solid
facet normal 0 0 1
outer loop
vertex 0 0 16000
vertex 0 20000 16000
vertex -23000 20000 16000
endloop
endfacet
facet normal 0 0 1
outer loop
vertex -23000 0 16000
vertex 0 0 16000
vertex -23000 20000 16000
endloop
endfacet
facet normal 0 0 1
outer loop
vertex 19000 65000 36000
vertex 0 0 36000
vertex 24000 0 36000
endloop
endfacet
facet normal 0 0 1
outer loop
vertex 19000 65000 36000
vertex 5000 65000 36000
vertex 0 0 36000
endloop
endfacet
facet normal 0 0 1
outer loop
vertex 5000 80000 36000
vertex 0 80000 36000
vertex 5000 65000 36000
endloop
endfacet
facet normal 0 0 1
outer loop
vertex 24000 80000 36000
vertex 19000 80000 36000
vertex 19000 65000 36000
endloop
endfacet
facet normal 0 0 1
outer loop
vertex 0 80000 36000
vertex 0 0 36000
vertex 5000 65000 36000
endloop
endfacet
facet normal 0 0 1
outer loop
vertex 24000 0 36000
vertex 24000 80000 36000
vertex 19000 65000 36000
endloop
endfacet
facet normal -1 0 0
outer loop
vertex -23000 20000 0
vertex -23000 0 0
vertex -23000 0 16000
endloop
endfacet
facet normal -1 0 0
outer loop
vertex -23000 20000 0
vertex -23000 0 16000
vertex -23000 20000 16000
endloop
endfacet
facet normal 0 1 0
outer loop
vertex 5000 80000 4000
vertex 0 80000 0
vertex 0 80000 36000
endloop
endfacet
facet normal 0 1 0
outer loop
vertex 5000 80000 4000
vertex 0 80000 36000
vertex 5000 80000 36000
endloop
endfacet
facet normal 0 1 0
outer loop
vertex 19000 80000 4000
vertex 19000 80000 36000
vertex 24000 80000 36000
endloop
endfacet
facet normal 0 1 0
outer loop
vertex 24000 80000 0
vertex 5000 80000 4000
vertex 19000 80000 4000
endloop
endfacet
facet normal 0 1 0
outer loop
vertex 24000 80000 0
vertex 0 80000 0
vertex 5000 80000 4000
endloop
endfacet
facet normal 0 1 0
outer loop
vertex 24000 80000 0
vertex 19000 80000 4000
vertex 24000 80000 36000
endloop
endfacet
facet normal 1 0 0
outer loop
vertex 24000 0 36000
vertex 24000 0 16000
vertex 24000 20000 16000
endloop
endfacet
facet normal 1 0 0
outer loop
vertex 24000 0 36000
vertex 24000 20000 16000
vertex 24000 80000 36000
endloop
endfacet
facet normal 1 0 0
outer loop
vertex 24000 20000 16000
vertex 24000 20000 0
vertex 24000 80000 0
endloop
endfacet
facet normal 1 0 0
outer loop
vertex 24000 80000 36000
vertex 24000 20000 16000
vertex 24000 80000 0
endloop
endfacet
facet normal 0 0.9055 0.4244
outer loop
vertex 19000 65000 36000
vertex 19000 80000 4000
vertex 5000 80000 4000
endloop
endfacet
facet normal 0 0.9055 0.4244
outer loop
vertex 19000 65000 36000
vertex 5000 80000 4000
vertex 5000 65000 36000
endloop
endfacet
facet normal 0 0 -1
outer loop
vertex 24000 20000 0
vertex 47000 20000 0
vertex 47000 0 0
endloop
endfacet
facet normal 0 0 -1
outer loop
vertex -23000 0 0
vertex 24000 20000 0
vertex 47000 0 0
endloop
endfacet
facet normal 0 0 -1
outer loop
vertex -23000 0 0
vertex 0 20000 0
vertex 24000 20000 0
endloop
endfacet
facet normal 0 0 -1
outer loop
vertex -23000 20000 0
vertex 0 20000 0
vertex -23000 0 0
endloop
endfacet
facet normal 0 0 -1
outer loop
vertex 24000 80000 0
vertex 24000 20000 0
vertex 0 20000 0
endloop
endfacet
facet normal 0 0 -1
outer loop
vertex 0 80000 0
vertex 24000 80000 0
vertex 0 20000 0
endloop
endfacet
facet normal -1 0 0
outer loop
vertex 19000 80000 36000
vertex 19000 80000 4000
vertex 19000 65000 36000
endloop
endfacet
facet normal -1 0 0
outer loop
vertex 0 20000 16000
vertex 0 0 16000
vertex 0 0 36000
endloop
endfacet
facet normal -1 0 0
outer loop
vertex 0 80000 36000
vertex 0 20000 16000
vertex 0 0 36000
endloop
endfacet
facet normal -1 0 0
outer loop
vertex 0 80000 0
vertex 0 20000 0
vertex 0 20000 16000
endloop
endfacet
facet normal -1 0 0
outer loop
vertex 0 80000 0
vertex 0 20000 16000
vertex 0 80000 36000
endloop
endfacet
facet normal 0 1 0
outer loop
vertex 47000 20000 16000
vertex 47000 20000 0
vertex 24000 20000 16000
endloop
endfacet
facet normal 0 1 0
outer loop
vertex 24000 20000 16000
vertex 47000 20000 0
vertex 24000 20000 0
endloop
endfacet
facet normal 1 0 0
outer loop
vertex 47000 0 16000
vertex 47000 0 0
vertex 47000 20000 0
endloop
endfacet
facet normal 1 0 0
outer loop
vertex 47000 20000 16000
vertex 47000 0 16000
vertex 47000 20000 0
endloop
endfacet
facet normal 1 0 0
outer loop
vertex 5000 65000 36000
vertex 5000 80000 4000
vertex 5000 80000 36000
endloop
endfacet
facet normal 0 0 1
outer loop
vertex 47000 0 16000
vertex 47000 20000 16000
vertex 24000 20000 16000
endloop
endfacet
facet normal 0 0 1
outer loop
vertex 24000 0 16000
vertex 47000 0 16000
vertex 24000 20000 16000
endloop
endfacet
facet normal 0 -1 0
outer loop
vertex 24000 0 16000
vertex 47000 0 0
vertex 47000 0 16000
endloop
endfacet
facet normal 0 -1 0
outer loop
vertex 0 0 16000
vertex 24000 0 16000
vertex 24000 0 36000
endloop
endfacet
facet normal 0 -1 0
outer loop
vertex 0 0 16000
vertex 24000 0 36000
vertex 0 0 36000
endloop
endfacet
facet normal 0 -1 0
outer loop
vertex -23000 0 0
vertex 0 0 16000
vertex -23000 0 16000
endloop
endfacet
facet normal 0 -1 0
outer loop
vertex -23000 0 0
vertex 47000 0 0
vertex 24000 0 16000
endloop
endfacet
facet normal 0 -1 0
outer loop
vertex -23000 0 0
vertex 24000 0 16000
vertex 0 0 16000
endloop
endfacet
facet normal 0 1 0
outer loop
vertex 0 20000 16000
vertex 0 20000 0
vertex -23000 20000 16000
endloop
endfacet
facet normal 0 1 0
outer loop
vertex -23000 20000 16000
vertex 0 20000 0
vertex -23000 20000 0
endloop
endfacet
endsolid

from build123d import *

# Parameters (mm, degrees)
SKETCH1_W           = 24000
SKETCH1_H           = 80000
BOSS_EXTRUDE1_DEPTH = 36000
CUT_EXTRUDE1_START  = -5000
CUT_EXTRUDE1_DEPTH  = 14000
SKETCH3_W           = 23000
SKETCH3_H           = 20000
BOSS_EXTRUDE2_DEPTH = 16000


with BuildPart() as part:
    # Sketch1 → Boss-Extrude1 (new body)
    with BuildSketch(Plane.XY):
        with Locations((12000, 40000)):
            Rectangle(SKETCH1_W, SKETCH1_H)
    extrude(amount=BOSS_EXTRUDE1_DEPTH)

    # Sketch2 → Cut-Extrude1 (cut)
    with BuildSketch(Plane(origin=(24000, 0, 0), x_dir=(0, 0, -1), z_dir=(1, 0, 0)).offset(CUT_EXTRUDE1_START)):
        Polygon((-36000, 80000), (-4000, 80000), (-36000, 65000), align=None)
    extrude(amount=-CUT_EXTRUDE1_DEPTH, mode=Mode.SUBTRACT)

    # Sketch3 → Boss-Extrude2 (add)
    with BuildSketch(Plane(origin=(0, 0, 0), x_dir=(-1, 0, 0), z_dir=(0, 0, -1))):
        with Locations((-35500, 10000)):
            Rectangle(SKETCH3_W, SKETCH3_H)
        with Locations((11500, 10000)):
            Rectangle(SKETCH3_W, SKETCH3_H)
    extrude(amount=-BOSS_EXTRUDE2_DEPTH)


solid = part.part
